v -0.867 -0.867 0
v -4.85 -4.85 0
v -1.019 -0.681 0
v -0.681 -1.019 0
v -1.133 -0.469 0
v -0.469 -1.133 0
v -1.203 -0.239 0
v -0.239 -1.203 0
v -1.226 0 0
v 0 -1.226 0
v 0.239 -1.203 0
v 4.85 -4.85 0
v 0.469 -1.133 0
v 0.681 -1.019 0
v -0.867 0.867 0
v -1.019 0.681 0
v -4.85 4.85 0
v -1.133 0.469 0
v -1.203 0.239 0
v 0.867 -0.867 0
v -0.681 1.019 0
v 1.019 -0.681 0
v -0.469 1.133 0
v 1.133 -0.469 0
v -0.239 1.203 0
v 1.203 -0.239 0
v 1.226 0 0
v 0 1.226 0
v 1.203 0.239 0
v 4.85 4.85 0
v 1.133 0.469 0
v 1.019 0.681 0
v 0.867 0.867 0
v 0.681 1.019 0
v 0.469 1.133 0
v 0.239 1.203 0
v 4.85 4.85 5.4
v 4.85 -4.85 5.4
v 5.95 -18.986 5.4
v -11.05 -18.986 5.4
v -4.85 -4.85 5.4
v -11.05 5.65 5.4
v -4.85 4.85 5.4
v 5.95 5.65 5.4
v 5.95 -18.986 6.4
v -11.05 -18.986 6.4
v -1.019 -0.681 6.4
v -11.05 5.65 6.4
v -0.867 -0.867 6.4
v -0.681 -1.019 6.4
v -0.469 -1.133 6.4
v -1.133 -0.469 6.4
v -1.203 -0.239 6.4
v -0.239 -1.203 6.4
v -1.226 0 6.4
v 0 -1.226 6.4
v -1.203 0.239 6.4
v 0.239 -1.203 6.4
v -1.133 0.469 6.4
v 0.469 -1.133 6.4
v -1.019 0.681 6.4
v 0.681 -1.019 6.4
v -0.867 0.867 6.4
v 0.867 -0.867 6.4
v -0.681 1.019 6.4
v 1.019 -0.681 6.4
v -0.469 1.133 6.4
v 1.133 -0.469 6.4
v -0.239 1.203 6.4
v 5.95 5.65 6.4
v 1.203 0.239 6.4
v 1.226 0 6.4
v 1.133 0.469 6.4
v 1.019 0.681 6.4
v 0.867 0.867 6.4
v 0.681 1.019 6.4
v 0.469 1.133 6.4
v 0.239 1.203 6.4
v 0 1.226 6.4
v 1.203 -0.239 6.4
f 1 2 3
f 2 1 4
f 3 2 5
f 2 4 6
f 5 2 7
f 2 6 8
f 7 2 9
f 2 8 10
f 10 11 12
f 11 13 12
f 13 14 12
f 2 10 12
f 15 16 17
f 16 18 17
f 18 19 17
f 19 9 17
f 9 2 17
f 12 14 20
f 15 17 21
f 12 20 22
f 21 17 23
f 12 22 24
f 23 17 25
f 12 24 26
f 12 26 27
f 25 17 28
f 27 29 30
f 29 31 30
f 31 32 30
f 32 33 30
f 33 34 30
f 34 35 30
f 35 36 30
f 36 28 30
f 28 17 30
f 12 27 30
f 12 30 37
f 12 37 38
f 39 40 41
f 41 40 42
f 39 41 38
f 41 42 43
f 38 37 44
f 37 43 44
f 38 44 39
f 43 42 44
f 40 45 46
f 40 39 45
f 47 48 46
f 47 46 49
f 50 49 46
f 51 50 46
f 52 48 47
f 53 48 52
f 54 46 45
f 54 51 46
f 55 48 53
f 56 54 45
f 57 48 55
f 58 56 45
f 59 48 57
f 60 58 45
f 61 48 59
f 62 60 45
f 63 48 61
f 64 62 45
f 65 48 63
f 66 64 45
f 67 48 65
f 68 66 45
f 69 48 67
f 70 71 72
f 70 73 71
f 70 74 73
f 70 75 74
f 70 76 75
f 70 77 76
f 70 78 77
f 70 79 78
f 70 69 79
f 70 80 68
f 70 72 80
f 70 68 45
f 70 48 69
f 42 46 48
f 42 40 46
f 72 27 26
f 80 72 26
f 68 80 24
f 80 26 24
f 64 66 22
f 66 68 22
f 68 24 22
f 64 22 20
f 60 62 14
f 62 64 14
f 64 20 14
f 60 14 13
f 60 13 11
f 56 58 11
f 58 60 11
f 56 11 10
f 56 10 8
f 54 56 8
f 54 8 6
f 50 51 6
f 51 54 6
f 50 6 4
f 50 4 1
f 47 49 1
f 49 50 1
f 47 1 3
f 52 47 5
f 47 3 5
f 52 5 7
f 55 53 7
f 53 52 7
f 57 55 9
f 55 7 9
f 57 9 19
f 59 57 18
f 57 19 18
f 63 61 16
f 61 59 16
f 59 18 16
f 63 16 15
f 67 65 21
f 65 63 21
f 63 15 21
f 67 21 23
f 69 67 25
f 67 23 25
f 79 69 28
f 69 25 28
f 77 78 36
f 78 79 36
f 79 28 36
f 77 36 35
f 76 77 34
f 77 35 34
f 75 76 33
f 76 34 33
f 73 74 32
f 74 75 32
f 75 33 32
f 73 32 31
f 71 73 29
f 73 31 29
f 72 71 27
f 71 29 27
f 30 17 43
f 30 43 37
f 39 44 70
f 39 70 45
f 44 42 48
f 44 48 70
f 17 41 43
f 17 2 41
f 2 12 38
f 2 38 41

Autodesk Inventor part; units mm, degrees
ref_plane "YZ Plane" through (0, 0, 0) normal (1, 0, 0) x (0, 1, 0)
ref_plane "XZ Plane" through (0, 0, 0) normal (0, 1, 0) x (-1, 0, 0)
ref_plane "XY Plane" through (0, 0, 0) normal (0, 0, 1) x (1, 0, 0)
sketch "Skizze1" plane through (0, 0, 0) normal (0, 0, 1) x (1, 0, 0)
  line L0 (-4.85, 4.85) -> (4.85, 4.85)
  line L1 (4.85, 4.85) -> (4.85, -4.85)
  line L2 (4.85, -4.85) -> (-4.85, -4.85)
  line L3 (-4.85, -4.85) -> (-4.85, 4.85)
  line L4 (-4.85, 4.85) -> (4.85, -4.85) construction
  line L5 (4.85, 4.85) -> (-4.85, -4.85) construction
  circle A0 centre (0, 0) radius 1.2261
  dimension "d0" = 9.7
  dimension "d1" = 9.7
extrude "Extrusion1" add sketch "Skizze1" along normal blind 5.4
sketch "Sketch2" plane through (0, 0, 5.4) normal (0, 0, 1) x (1, 0, 0)
  circle A0 centre (0, 0) radius 1.2261 projected
  line L0 (4.85, 4.85) -> (-4.85, 4.85) projected
  line L1 (-4.85, 4.85) -> (-4.85, -4.85) projected
  line L2 (-4.85, -4.85) -> (4.85, -4.85) projected
  line L3 (4.85, -4.85) -> (4.85, 4.85) projected
  line L4 (-11.05, 5.65) -> (5.95, 5.65)
  line L5 (5.95, 5.65) -> (5.95, -18.9856)
  line L6 (5.95, -18.9856) -> (-11.05, -18.9856)
  line L7 (-11.05, -18.9856) -> (-11.05, 5.65)
  dimension "d4" = 10.8
  dimension "d5" = 15.9
  dimension "d6" = 10.5
extrude "Extrusion2" add sketch "Sketch2" along normal blind 1 contours L3 L2 L1 L0 | L4 L5 L6 L7
properties part number "LG_G2_Lens"
